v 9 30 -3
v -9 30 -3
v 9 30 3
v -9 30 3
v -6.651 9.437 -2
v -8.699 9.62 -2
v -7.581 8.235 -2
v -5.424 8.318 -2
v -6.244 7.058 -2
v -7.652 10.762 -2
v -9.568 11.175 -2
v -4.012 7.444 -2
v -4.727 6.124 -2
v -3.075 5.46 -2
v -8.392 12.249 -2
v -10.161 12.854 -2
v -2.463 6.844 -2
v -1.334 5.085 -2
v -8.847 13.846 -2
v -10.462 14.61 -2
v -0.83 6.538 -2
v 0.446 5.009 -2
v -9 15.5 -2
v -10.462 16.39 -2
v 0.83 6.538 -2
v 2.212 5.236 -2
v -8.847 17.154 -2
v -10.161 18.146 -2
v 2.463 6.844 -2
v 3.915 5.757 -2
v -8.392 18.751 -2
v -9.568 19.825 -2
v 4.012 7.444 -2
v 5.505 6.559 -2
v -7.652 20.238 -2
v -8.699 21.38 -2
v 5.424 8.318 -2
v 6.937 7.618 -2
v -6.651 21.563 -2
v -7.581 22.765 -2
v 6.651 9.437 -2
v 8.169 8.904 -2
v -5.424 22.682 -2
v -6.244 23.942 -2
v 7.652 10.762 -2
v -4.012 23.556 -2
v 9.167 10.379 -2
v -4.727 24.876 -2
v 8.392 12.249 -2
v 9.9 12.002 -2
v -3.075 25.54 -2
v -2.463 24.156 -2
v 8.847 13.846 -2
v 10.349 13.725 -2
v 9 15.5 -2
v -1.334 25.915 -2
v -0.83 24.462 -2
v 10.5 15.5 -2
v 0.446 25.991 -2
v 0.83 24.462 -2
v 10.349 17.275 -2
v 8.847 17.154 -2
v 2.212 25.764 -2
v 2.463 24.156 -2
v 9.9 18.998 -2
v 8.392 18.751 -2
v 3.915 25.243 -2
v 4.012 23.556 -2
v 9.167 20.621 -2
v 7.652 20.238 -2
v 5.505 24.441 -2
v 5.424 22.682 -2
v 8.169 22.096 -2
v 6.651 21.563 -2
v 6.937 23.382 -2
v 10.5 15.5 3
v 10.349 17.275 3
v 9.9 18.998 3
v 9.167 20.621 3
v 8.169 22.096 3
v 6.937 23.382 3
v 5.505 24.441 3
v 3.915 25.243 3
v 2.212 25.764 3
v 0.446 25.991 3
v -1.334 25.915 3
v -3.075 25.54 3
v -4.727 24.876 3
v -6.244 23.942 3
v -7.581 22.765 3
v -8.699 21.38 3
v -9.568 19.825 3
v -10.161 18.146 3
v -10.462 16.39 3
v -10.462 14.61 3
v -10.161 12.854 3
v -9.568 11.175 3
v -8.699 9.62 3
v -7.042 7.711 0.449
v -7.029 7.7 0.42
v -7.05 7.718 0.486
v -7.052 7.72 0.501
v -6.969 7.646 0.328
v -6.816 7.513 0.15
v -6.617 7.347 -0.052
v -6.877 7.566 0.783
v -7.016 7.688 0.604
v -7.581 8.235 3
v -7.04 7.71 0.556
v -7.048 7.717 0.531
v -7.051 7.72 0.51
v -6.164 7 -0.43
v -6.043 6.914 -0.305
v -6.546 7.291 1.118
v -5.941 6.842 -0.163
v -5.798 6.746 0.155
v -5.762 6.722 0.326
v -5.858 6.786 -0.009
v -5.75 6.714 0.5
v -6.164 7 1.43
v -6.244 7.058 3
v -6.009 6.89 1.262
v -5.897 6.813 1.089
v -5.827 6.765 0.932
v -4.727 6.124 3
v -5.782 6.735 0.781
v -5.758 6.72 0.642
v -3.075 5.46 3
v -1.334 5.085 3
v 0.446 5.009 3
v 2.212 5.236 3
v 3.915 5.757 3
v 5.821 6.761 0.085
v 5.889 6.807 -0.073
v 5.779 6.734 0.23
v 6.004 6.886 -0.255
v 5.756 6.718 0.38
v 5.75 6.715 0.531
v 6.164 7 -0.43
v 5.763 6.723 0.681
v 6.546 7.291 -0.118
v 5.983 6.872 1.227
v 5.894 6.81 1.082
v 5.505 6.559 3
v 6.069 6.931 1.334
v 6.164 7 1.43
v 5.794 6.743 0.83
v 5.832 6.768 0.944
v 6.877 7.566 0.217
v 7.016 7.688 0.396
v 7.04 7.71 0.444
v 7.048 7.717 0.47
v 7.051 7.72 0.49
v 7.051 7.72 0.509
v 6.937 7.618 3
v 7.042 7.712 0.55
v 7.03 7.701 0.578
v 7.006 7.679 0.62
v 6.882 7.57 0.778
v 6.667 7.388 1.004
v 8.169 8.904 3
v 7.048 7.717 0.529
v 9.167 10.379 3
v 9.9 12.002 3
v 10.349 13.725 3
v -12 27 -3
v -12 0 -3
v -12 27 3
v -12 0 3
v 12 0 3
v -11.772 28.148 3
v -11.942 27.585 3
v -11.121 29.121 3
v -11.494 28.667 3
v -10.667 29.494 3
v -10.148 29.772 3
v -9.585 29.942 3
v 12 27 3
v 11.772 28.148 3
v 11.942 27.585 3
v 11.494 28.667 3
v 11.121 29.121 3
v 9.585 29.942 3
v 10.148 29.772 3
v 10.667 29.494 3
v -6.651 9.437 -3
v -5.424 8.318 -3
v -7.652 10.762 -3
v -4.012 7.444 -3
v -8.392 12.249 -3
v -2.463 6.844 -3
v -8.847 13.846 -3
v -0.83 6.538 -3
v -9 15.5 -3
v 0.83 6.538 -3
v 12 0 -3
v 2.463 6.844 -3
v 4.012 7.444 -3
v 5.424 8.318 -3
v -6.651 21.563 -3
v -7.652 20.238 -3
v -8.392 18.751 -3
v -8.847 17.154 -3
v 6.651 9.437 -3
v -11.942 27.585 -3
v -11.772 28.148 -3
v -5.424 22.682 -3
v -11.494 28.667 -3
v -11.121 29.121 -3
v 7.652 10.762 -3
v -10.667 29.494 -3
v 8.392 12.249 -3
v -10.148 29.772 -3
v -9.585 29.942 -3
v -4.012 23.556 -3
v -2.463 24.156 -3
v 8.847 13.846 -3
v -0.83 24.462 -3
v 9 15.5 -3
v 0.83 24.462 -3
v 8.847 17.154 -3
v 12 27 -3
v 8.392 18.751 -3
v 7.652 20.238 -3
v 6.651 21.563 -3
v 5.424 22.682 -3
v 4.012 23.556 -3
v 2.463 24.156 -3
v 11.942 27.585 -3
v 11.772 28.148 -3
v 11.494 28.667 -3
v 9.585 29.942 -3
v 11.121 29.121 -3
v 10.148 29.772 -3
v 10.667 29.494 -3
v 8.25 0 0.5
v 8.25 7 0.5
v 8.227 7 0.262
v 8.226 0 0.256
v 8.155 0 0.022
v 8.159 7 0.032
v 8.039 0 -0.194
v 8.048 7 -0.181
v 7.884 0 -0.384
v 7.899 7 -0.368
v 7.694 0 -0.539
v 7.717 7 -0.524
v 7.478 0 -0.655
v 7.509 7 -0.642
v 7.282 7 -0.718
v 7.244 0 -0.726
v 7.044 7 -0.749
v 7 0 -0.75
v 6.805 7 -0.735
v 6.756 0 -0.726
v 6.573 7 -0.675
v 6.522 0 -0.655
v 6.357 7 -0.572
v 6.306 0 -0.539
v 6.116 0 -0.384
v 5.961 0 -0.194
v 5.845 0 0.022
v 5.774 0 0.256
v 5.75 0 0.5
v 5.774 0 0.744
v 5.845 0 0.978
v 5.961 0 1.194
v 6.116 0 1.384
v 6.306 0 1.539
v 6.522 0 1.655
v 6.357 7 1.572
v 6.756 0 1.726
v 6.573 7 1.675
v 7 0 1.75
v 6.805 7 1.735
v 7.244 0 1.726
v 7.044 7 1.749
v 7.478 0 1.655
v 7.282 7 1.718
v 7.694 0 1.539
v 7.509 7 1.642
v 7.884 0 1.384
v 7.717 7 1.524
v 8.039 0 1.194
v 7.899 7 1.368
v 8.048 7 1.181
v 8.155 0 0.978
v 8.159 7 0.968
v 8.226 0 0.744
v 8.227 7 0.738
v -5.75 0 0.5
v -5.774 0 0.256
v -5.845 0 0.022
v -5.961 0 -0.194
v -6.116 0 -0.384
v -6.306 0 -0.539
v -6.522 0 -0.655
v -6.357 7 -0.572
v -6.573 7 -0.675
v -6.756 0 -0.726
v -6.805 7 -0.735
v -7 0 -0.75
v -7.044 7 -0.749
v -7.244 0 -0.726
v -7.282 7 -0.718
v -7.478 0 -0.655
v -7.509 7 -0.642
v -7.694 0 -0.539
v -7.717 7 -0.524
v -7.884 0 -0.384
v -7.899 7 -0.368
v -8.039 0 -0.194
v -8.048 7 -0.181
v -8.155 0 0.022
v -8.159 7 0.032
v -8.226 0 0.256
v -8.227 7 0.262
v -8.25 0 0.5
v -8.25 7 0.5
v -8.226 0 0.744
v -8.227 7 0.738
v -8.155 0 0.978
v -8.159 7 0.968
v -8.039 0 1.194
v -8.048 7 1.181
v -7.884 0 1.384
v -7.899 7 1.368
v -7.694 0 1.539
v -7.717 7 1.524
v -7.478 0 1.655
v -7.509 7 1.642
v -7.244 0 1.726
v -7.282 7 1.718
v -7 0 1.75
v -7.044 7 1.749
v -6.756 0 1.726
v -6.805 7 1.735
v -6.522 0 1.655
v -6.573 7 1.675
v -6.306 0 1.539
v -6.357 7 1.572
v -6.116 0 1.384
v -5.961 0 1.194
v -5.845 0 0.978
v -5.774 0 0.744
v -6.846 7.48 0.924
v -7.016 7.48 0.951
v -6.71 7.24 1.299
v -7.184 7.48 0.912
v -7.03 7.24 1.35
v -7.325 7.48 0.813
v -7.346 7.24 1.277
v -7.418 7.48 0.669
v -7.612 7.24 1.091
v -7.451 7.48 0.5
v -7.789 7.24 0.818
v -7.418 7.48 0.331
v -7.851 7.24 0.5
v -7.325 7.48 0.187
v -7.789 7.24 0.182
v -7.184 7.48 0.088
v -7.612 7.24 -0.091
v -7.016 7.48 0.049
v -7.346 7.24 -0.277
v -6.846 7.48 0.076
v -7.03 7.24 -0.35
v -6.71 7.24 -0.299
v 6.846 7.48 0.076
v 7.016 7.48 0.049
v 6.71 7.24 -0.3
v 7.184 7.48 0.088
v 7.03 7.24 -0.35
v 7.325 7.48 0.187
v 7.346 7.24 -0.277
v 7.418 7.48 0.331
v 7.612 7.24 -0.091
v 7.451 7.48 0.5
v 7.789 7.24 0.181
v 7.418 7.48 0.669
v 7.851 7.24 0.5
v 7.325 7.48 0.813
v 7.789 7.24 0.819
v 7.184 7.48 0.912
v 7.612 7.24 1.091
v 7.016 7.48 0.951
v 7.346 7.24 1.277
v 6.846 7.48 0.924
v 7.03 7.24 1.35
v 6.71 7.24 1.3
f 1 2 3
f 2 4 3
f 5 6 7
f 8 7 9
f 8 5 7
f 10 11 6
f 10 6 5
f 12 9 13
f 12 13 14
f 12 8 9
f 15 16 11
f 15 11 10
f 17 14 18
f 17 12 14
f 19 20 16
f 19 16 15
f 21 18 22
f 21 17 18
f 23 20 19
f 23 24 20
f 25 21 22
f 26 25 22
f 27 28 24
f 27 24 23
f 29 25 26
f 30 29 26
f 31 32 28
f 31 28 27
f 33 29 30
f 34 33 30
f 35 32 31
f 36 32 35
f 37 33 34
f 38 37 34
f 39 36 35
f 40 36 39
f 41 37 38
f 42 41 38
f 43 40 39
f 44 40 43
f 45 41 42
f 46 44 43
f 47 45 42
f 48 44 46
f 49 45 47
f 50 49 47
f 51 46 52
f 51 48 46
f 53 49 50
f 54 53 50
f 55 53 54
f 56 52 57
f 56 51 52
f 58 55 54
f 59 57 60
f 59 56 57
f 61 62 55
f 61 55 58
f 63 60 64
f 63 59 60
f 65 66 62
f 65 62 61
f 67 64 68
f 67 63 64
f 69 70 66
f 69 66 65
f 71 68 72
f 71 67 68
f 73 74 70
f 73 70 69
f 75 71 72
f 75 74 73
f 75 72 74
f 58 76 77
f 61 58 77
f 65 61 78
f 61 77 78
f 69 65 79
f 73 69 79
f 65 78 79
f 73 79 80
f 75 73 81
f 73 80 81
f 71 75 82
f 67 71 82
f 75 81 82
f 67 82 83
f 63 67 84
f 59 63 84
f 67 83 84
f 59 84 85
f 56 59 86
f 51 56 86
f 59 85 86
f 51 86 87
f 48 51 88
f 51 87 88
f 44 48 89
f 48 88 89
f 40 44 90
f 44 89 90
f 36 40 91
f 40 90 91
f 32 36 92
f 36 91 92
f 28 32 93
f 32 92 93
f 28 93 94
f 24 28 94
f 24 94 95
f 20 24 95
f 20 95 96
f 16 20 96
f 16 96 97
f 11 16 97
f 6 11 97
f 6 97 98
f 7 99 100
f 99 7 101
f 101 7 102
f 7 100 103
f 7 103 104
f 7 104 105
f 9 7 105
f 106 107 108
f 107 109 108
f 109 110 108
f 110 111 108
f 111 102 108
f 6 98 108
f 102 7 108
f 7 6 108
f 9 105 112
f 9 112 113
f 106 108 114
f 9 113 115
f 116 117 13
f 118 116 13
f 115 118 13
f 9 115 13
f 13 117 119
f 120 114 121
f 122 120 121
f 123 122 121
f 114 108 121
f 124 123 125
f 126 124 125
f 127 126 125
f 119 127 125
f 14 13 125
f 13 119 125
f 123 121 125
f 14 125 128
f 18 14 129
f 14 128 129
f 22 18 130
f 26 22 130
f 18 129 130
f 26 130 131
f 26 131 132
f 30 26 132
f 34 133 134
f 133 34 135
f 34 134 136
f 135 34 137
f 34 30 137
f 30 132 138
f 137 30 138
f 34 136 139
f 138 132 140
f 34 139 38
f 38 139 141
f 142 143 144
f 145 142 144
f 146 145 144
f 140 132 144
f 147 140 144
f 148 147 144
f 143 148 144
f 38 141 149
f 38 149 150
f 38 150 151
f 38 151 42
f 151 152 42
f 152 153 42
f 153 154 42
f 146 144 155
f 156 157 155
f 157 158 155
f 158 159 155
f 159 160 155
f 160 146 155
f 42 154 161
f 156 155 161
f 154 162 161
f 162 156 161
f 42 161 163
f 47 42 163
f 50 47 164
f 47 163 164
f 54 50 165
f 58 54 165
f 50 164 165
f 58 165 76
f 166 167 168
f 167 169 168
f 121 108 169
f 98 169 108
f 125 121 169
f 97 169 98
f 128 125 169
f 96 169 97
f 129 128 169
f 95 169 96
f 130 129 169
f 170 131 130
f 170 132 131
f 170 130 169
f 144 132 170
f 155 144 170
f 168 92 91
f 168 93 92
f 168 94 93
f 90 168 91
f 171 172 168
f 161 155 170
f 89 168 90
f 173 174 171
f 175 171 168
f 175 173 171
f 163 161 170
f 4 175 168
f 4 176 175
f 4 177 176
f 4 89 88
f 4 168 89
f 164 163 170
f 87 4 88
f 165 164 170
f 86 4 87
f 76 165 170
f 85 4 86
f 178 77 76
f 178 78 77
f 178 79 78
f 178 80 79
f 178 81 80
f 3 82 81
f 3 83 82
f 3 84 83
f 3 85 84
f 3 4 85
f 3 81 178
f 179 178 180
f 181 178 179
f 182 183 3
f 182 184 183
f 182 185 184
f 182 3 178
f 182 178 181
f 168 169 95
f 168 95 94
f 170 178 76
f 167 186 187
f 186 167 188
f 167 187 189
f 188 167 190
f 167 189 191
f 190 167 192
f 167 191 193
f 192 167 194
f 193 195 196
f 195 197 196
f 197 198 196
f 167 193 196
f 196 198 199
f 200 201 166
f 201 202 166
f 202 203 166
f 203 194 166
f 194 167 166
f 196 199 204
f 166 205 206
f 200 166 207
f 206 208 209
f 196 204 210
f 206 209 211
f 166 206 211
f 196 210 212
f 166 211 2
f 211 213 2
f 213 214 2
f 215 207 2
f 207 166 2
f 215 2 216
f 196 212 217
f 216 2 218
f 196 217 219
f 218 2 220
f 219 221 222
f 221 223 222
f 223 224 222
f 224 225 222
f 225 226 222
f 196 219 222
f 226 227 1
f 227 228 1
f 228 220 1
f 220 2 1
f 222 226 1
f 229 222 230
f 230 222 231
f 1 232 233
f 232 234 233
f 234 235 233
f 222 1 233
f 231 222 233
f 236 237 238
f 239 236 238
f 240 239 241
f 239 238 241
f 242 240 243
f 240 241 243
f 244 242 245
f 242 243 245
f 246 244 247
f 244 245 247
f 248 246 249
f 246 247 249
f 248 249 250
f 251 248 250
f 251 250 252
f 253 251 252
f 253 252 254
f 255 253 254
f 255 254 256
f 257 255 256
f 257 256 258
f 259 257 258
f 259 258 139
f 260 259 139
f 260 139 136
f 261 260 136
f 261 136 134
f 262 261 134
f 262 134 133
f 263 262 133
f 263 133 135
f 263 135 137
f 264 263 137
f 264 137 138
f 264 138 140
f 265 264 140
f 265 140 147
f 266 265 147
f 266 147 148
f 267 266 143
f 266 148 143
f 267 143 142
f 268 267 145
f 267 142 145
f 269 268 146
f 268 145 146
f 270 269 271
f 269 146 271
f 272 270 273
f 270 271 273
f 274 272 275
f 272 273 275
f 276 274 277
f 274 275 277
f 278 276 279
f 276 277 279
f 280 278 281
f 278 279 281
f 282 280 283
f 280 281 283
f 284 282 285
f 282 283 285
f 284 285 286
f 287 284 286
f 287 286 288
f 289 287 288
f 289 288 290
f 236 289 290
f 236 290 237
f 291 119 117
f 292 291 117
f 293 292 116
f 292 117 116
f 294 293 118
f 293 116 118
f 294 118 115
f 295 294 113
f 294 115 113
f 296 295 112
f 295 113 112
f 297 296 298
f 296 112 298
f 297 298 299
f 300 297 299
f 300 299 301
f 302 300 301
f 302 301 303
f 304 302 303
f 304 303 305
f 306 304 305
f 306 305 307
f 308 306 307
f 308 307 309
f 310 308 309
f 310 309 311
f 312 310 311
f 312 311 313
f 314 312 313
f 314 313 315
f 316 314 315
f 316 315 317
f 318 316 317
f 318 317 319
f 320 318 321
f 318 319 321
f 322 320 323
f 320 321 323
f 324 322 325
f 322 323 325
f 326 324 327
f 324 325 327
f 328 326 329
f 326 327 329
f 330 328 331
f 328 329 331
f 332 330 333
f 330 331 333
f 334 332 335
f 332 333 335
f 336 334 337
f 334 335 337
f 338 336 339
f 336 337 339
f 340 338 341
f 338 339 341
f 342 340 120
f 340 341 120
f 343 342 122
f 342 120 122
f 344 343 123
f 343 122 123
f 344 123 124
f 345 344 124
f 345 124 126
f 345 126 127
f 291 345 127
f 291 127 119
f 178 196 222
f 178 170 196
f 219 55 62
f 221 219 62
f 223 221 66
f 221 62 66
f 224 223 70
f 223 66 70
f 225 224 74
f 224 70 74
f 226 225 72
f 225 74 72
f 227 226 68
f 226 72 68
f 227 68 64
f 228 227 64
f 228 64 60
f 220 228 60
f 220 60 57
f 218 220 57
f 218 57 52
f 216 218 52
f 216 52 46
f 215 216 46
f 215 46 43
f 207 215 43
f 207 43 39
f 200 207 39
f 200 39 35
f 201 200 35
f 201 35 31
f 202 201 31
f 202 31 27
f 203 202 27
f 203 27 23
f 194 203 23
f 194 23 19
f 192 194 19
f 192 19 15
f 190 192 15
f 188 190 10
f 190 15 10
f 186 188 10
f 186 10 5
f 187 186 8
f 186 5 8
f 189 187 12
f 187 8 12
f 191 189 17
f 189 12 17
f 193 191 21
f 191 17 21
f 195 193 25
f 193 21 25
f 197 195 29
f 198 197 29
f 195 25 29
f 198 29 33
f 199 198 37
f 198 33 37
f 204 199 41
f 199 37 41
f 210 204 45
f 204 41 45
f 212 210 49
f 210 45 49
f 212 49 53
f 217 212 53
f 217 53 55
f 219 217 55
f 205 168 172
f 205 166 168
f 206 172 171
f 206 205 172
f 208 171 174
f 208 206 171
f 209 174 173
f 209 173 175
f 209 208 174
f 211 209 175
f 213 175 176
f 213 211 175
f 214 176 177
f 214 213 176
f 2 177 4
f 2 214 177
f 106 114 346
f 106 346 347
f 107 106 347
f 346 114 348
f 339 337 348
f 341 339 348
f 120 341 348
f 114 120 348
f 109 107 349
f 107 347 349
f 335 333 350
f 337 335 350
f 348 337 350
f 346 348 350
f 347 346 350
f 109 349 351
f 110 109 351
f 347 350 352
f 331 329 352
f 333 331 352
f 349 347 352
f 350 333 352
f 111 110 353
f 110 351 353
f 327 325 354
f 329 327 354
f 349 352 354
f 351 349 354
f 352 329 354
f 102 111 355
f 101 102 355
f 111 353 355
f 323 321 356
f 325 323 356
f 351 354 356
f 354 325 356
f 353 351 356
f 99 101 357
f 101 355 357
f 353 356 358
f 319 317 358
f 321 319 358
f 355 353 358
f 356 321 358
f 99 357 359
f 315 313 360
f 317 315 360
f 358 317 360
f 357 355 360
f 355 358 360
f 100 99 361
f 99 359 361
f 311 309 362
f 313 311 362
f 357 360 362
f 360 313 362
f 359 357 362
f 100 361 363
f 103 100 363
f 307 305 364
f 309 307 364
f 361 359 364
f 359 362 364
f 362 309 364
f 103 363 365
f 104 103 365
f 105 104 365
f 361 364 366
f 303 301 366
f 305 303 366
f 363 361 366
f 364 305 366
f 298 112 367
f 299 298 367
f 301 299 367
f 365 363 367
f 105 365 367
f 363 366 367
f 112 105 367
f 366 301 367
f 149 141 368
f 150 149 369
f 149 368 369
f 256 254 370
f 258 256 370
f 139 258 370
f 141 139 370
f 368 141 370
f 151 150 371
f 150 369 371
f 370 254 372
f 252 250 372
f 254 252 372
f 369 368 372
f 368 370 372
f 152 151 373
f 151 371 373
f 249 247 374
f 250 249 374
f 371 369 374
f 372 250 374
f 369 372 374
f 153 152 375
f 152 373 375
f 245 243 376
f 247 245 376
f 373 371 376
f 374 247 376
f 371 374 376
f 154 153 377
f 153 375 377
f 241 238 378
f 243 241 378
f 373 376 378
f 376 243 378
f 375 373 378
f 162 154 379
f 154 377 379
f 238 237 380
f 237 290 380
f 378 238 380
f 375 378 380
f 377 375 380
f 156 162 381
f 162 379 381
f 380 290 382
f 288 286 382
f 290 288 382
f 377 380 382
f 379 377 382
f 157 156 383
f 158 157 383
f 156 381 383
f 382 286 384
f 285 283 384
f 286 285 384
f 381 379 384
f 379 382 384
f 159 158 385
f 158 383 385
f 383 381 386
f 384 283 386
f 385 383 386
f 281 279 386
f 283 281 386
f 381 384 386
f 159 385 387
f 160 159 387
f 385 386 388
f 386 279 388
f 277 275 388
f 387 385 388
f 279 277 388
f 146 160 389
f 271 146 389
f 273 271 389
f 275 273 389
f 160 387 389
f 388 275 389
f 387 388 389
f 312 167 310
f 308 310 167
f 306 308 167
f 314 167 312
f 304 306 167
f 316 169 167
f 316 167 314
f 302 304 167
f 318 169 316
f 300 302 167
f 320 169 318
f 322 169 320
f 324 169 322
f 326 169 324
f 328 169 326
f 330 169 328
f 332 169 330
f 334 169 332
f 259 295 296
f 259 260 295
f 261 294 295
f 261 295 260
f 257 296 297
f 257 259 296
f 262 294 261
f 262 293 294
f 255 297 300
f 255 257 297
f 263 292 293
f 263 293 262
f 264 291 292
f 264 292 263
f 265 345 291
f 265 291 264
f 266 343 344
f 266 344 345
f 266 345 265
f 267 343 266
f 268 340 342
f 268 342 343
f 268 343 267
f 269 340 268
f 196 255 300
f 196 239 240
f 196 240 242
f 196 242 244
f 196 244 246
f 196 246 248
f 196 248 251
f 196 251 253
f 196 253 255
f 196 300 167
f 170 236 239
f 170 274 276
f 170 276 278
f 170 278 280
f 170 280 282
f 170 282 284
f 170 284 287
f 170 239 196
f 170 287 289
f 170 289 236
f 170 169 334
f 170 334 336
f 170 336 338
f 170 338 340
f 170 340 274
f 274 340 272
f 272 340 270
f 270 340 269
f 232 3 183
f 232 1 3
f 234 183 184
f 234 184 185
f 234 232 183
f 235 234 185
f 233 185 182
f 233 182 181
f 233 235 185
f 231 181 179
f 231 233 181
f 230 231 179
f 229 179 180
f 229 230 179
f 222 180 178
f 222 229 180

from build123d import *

# Parameters (mm, degrees)
SKIZZE1_W                       = 24
SKIZZE1_H                       = 30
AUFSATZ_LINEAR_AUSTRAGEN1_DEPTH = 3
SKIZZE2_R                       = 10.5
SCHNITT_LINEAR_AUSTRAGEN2_DEPTH = 5
SKIZZE2_3_R                     = 9
SCHNITT_LINEAR_AUSTRAGEN3_DEPTH = 7
VERRUNDUNG1_R                   = 3
M3_GEWINDEBOHRUNG1_D            = 2.5
M3_GEWINDEBOHRUNG1_DEPTH        = 7
M3_GEWINDEBOHRUNG1_TIP          = 0.751075774


with BuildPart() as part:
    # Skizze1 → Aufsatz-Linear austragen1 (new body, symmetric)
    with BuildSketch(Plane.XY):
        with Locations((0, 15)):
            Rectangle(SKIZZE1_W, SKIZZE1_H)
    extrude(amount=AUFSATZ_LINEAR_AUSTRAGEN1_DEPTH, both=True)

    # Skizze2 → Schnitt-Linear austragen2 (cut)
    with BuildSketch(Plane.XY.offset(3)):
        with Locations((0, 15.5)):
            Circle(SKIZZE2_R)
    extrude(amount=-SCHNITT_LINEAR_AUSTRAGEN2_DEPTH, mode=Mode.SUBTRACT)

    # Skizze2<3> → Schnitt-Linear austragen3 (cut, through all)
    with BuildSketch(Plane.XY.offset(3)):
        with Locations((0, 15.5)):
            Circle(SKIZZE2_3_R)
    extrude(amount=-SCHNITT_LINEAR_AUSTRAGEN3_DEPTH, mode=Mode.SUBTRACT)

    # Verrundung1
    verrundung1_edges = [part.edges().sort_by_distance(p)[0] for p in [
        (-12, 30, 0),
        (12, 30, 0),
    ]]
    fillet(verrundung1_edges, radius=VERRUNDUNG1_R)

    # M3 Gewindebohrung1
    with Locations(Plane(origin=(0, 0, 0), x_dir=(-1, 0, 0), z_dir=(0, -1, 0))):
        with Locations((-7, -0.5), (7, -0.5)):
            Hole(M3_GEWINDEBOHRUNG1_D / 2, depth=M3_GEWINDEBOHRUNG1_DEPTH)
            with Locations((0, 0, -(M3_GEWINDEBOHRUNG1_DEPTH + M3_GEWINDEBOHRUNG1_TIP / 2))):  # 118° drill point
                Cone(0, M3_GEWINDEBOHRUNG1_D / 2, M3_GEWINDEBOHRUNG1_TIP, mode=Mode.SUBTRACT)


solid = part.part
